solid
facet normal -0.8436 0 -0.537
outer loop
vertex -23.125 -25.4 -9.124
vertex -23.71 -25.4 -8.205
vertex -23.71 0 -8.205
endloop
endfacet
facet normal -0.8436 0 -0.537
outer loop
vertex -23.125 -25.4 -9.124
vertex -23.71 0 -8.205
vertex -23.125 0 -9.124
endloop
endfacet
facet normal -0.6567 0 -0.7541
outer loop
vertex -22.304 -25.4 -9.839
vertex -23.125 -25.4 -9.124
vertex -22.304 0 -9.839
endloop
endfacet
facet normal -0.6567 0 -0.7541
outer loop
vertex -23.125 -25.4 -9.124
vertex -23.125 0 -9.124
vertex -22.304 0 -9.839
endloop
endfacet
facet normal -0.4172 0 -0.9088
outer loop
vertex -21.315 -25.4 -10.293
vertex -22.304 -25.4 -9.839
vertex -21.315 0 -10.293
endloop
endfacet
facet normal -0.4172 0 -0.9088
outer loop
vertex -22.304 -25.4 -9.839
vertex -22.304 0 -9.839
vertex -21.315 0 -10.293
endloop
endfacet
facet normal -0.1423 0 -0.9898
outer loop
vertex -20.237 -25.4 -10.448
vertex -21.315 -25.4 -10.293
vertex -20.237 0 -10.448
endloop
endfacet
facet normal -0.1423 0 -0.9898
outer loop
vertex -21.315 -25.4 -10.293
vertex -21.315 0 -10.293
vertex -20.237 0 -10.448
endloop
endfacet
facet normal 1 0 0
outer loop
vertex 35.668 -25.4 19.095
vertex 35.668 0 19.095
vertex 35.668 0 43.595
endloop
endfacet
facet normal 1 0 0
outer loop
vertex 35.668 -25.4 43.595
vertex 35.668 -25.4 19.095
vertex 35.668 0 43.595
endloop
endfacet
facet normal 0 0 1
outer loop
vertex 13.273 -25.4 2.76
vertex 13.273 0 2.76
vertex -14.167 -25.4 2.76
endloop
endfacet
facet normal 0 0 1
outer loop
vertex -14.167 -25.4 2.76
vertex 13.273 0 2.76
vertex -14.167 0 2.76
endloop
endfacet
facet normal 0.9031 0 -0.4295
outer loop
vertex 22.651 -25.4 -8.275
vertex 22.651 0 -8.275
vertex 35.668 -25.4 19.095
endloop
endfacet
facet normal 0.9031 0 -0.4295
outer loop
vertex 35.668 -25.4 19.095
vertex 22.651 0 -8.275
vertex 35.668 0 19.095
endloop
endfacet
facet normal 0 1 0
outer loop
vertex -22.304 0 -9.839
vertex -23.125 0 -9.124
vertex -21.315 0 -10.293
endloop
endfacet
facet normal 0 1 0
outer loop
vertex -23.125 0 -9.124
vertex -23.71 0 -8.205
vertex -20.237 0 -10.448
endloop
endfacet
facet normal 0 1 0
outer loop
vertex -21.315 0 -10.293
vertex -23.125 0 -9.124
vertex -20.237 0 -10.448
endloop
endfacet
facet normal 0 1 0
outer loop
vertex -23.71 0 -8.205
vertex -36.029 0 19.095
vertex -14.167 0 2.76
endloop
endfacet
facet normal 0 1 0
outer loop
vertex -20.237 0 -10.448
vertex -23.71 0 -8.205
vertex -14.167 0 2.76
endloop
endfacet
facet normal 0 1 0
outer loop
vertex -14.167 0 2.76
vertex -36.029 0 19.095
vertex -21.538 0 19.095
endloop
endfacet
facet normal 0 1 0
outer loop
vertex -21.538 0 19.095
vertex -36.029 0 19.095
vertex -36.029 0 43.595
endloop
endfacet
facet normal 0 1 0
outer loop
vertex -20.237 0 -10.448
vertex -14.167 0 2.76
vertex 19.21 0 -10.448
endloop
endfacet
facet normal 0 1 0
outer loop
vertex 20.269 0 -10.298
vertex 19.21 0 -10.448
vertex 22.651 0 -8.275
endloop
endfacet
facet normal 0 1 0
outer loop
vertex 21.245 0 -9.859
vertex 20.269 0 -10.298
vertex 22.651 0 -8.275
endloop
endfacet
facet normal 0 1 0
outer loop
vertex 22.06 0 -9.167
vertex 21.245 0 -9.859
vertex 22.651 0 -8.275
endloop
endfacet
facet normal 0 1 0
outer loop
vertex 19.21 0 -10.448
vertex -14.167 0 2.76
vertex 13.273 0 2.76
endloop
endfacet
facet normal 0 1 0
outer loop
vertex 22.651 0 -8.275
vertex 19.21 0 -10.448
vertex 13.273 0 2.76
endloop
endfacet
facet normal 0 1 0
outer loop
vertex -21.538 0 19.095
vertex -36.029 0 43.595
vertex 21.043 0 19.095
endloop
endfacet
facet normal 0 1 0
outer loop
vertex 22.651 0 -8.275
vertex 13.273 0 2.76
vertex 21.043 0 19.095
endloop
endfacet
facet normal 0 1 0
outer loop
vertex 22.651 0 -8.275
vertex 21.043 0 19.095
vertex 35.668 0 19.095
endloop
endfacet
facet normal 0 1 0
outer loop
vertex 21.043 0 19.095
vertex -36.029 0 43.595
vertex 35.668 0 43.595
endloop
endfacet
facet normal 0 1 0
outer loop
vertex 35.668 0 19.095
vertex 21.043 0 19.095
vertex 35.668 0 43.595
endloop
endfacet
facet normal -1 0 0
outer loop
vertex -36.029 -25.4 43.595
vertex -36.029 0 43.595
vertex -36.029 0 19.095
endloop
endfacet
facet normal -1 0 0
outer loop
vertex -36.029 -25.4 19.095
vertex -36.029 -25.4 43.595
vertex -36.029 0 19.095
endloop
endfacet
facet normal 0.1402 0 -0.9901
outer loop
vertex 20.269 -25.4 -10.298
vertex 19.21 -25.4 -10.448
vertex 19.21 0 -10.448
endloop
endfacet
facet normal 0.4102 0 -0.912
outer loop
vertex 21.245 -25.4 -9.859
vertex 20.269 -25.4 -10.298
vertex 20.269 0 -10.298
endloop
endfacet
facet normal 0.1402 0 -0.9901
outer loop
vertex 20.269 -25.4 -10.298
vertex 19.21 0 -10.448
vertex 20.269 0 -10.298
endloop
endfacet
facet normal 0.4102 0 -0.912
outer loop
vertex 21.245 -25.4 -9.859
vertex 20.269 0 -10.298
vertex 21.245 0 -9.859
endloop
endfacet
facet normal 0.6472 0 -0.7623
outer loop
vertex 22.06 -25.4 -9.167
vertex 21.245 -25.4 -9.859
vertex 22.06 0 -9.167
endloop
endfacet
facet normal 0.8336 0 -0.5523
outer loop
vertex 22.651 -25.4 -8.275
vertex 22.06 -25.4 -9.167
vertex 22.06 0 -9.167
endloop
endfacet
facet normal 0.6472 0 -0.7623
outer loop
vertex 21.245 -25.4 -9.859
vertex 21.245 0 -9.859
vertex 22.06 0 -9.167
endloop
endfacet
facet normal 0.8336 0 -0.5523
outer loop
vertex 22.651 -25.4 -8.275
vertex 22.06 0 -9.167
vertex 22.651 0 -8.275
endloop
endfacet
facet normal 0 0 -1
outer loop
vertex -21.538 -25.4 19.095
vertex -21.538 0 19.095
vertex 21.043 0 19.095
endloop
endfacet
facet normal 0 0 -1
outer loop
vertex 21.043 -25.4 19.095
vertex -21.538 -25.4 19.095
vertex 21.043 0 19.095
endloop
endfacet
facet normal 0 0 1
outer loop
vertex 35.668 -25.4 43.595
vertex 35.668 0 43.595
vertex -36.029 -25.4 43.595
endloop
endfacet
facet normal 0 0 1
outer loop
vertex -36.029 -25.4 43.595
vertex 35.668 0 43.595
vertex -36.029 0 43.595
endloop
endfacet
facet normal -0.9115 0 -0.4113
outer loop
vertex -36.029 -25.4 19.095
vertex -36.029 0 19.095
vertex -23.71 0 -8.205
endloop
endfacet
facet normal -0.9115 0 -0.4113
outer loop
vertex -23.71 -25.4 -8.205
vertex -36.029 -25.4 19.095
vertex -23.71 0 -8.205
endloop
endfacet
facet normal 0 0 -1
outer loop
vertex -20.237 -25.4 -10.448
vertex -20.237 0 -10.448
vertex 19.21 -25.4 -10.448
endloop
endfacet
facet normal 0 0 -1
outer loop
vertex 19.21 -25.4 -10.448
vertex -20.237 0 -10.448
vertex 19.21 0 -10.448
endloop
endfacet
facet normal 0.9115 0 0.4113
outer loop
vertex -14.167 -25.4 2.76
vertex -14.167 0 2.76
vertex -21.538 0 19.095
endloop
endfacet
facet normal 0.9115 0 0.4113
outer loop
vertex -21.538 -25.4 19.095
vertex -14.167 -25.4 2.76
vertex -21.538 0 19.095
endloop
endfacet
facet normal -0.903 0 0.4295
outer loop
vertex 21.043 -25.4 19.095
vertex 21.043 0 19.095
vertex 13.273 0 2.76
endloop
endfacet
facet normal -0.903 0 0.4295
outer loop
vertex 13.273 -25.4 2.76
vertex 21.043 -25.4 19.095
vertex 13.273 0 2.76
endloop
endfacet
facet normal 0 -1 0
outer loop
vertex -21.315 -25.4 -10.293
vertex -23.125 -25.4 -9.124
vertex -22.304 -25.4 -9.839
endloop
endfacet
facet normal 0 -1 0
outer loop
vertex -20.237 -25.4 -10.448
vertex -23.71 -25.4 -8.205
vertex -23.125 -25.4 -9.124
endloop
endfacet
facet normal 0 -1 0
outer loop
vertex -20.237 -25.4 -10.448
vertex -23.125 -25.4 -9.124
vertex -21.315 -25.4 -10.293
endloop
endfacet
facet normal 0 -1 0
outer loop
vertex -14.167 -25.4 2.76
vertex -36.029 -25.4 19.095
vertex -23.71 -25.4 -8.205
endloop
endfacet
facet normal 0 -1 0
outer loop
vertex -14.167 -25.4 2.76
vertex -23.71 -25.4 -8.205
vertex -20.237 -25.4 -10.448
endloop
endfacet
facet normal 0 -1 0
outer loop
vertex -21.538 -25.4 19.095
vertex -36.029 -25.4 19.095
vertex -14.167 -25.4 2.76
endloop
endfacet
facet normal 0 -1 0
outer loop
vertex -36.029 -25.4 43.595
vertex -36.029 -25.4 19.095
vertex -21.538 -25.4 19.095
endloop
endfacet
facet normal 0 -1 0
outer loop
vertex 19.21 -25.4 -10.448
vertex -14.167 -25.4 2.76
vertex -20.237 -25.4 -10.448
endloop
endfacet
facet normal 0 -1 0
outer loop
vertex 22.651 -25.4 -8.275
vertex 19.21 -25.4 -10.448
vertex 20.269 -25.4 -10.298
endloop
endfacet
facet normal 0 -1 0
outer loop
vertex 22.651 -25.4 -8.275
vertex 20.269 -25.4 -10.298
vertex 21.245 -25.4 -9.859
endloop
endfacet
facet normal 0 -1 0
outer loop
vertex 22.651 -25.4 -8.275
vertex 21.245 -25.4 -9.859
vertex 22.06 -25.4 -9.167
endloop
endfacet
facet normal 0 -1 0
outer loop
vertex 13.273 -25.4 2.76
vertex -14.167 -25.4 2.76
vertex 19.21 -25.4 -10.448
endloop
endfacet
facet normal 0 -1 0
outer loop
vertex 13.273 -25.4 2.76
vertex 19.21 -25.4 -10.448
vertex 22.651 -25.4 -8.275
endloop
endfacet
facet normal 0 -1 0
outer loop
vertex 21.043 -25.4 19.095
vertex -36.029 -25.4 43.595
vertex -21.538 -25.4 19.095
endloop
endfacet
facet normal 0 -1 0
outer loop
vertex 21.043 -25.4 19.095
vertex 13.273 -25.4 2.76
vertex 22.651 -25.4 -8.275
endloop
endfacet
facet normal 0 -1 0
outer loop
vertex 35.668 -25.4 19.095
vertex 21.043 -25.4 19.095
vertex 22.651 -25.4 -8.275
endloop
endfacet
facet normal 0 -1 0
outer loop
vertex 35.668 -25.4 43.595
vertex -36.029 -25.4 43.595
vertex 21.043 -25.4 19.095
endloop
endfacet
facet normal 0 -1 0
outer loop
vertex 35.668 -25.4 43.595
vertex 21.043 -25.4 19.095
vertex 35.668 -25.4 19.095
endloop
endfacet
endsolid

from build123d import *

# Parameters (mm, degrees)
F1_DEPTH = 25.4


with BuildPart() as f1:
    # F0 (on Front) → F1 (new body)
    with BuildSketch(Plane.XZ):
        Polygon((35.668362, 43.594655), (-36.028642, 43.594655), (-36.028642, 19.095179), (-21.538323, 19.095179), (21.042599, 19.095179), (35.668362, 19.095179), align=None)
        with BuildLine():
            Line((-21.538323, 19.095179), (-36.028642, 19.095179))
            Line((-36.028642, 19.095179), (-23.710124, -8.205322))
            ThreePointArc((-23.710124, -8.205322), (-22.304387, -9.838812), (-20.237289, -10.448311))
            Line((-20.237289, -10.448311), (19.210294, -10.448311))
            ThreePointArc((19.210294, -10.448311), (21.245158, -9.859402), (22.650968, -8.274729))
            Line((22.650968, -8.274729), (35.668362, 19.095179))
            Line((35.668362, 19.095179), (21.042599, 19.095179))
            Line((21.042599, 19.095179), (13.273281, 2.759688))
            Line((13.273281, 2.759688), (-14.16743, 2.759688))
            Line((-14.16743, 2.759688), (-21.538323, 19.095179))
        make_face()
    extrude(amount=F1_DEPTH)


solid = f1.part
